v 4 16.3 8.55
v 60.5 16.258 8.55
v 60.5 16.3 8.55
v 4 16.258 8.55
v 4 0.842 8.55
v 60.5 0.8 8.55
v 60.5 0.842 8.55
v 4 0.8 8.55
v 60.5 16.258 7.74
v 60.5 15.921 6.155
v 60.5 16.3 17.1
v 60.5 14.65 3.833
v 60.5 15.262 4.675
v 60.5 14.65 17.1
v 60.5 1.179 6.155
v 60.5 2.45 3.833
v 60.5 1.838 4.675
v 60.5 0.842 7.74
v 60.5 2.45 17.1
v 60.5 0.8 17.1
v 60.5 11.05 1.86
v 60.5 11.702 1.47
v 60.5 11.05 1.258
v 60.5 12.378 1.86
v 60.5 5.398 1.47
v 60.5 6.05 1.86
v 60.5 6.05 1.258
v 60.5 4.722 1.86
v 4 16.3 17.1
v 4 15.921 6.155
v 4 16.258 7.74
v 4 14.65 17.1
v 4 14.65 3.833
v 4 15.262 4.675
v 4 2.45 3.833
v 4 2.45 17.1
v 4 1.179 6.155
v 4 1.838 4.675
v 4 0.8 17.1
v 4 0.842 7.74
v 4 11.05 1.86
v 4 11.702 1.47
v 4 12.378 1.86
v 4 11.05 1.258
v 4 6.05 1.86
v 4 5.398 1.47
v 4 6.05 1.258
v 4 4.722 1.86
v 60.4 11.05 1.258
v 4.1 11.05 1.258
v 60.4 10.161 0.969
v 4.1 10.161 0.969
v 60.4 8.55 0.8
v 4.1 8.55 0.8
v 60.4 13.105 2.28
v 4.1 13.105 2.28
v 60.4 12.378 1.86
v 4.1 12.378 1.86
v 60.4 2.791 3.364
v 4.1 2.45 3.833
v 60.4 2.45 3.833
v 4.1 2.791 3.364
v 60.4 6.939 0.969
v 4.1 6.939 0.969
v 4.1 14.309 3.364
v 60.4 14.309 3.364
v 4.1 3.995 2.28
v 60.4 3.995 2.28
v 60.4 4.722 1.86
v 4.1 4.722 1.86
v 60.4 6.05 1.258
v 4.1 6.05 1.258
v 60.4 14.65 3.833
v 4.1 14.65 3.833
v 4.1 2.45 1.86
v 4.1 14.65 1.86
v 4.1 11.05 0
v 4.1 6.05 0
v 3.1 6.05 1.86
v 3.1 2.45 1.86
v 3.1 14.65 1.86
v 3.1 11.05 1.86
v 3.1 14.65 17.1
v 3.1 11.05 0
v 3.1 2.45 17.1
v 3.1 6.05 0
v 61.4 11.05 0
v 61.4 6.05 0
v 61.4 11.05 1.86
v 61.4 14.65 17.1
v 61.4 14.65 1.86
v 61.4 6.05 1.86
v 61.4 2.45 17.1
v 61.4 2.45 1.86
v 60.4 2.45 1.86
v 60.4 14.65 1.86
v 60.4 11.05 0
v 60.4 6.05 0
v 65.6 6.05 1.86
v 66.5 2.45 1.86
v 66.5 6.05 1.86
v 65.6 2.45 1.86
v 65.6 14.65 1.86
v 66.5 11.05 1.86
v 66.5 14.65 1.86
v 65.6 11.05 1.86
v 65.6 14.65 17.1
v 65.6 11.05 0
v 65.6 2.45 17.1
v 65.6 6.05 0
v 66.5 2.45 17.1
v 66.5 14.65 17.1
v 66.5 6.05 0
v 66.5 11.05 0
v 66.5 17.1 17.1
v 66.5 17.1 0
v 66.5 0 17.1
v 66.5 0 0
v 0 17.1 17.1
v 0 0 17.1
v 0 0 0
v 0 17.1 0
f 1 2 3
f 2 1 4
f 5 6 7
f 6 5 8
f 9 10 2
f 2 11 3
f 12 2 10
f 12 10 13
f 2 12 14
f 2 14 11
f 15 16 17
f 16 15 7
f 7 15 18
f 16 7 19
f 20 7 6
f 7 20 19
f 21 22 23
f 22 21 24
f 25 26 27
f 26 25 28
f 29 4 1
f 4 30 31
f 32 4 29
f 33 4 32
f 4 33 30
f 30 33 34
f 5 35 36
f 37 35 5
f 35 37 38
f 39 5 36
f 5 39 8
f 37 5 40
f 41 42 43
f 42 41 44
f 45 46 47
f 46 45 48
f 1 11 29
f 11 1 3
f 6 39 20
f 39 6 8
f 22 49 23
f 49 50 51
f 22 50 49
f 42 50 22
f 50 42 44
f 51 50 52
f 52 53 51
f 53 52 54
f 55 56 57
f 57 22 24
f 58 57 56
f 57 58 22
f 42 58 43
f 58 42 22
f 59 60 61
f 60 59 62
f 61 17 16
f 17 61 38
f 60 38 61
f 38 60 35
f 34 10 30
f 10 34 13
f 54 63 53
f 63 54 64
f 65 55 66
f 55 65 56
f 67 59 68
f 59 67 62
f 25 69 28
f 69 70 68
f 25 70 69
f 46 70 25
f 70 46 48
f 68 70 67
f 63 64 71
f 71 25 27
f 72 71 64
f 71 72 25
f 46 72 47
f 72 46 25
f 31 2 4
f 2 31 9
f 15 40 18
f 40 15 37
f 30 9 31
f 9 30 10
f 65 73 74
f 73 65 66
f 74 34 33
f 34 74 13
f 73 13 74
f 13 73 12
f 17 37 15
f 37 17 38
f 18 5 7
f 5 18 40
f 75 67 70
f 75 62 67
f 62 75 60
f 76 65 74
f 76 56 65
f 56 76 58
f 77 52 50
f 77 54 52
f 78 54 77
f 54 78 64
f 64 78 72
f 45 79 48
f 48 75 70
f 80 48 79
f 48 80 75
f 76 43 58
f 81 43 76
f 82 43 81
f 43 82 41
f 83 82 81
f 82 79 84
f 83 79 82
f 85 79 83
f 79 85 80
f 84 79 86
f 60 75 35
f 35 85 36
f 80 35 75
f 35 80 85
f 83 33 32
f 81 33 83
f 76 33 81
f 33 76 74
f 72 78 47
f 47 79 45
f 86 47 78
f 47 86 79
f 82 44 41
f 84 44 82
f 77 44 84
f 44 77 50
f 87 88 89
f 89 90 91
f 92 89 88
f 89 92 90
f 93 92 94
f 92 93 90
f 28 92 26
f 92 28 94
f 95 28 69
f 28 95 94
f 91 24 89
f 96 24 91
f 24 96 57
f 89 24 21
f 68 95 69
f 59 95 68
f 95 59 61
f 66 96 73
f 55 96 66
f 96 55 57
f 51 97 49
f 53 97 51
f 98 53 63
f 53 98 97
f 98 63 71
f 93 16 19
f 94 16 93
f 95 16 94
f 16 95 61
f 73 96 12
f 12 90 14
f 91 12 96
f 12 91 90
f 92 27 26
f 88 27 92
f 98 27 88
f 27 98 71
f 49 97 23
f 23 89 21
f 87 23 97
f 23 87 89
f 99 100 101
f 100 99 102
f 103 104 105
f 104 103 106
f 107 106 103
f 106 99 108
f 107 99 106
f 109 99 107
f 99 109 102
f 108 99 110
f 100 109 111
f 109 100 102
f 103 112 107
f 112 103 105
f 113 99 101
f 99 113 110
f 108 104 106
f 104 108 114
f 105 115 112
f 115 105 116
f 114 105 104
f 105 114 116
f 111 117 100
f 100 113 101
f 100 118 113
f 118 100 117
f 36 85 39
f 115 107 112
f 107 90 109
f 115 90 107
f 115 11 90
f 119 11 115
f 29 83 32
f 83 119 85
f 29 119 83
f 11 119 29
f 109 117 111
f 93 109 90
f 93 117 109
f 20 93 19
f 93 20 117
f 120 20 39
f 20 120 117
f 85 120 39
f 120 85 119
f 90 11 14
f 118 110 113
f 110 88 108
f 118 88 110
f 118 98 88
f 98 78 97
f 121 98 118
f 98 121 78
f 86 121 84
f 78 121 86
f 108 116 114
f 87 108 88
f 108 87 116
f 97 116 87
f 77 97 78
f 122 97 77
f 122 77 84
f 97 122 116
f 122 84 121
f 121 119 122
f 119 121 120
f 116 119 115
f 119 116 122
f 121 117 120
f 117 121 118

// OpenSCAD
// file: ../parts/battery_tab.scad
// Battery tabs for holding AA and similar sized batterys.
// Built for Keystone Electronics parts 5201 and 5223.
// 5201: https://www.keyelco.com/product-pdf.cfm?p=900
// 5223: https://www.keyelco.com/product-pdf.cfm?p=910


// TODO: function to return array for polygon? Is that useful?
// function battery_tab_size() = [1.45,11.20,11.99];

module battery_tab() {
  difference() {
    union() {
      // TODO: round corners?
      cube(size=[0.5, 11.2, 11.99]);
      translate([0, 11.2/2 - 3/2, 11.99])
        cube(size=[0.5, 3, 6.35]);
      translate([0.5, 11.2/2, 5]) {
        rotate([0, 90, 0]) {
          cylinder(h=1.45, r1=5.99/2, r2=3.99/2);
        }
      }
      translate([0.5, 11.2/2, 10.74]) {
        rotate([0, 90, 0]) {
          cylinder(r=2.49/2, h=0.5);
        }
      }
    }

    translate([-0.5, 11.2/2, 18.34-1.5]) {
      rotate([0, 90, 0]) {
        cylinder(r=1.7/2, h=2);
      }
    }
    translate([-0.5, 11.2/2, 10.74]) {
      rotate([0, 90, 0]) {
        cylinder(r=1.52/2, h=2);
      }
    }
  }
}

// function battery_tab_cutout_size() = [1,11.5,12.5];
// Cutout is the foot print of the tab, with padding on y and z.
// Also, Need a sane way to return where the battery aligns.
module battery_tab_cutout(center=false, vpin=false, extend=0) {
  // If center, put the center of the button onto 0,0,0
  // If vpin, add a tall skinny cylinder to visualize where the center is.
  // If extend, 'pull' an edge of the tab that far to allow for inserting the actual tab
  sze=[1, 11.2 + 1, 11.99 + 0.5];
  offset=center?[-0.5,-sze[1]/2,-5]:[0,0,0];
  translate(offset) {
    cube(size=sze);
    if (extend > 0) {
      translate([0, 0, -sze[2]+1]) {
        cube(size=sze);
      }
    }
    if (vpin) {
      translate([0, sze[1]/2, sze[2]/2]) {
        rotate([0, 90, 0]) {
          cylinder(r=0.5, h=20, center=true);
        }
      }
    }
    translate([0, sze[1]/2 - 2.5, sze[2]-0.5]) {
      cube(size=[1, 5, 11]);
    }
  }
}

battery_tab_cutout(center=true, $fs=0.5);
// file: ../parts/batteries.scad
// For all, if hole is true, then make a suitable cutout for holding the battery *AND* space for springs and
// contacts to connect it.
//
// Review https://en.wikipedia.org/wiki/List_of_battery_sizes for missing sizes; add as needed.

// All of these are cylinders
batteries_by_name = [
  // Name, Height, Diameter, button-top
  ["AAAA", 42.5, 8.3, true],
  ["AAA", 44.5, 10.5, true],
  ["AA", 49.5, 14.5, true],
  ["A23", 28.5, 10.3, true],
  ["C", 50, 26.2, true],
  ["D", 61.5, 34.2, true],
  ["LR41", 3.6, 7.9, false],
  ["LR44", 5.4, 11, false],
  ["CR1130", 3, 11.5, false],
];

/// Get the dimensions of a battery by name
// @param name The common name of the battery.
// @param hole When true, this is a hole to put the battery into.
function battery_size_by_name(name="AA", hole=false) =
  let(found_idx=search([name], batteries_by_name),
      found=batteries_by_name[found_idx[0]],
      dia=found[2] + (hole?1:0),
      height=found[1] + (hole?7:0) // See notes below
      )
      [height,dia];

/// A battery by name
// @param name The common name of the battery.
// @param hole When true, this is a hole to put the battery into.
module battery_by_name(name="AA", hole=false) {
  found_idx=search([name], batteries_by_name);
  found = batteries_by_name[found_idx[0]];
  if (hole) {
    // if button-top type, assume that it will get held by a wire spring, so 
    //   3mm for compressed spring; 2mm for button; 2mm for spacing
    // if not button-top, assume sheet metal spring, so 1.
    cylinder(h=found[1] + (found[3]?7:1), d=found[2] + 1);

  }else {
    cylinder(h=found[1], d=found[2]);
    if (found[3]) {
      // !!!! There is no standard sizing of the button, so we'll use a single size for now.
      translate([0, 0, found[1]])
        cylinder(d=5.5, h=1);
    }
  }
}


module AAA(hole=false) {
  battery_by_name(parent_module(1), hole);
}
module AA(hole=false) {
  battery_by_name(parent_module(1), hole);
}
module C(hole=false) {
  battery_by_name(parent_module(1), hole);
}
module LR44(hole=false) {
  battery_by_name(parent_module(1), hole);
}
// main file
// HexBug BattleBot Remote Expander
// Because some of us have big hands.


// Hold the exsting remote with batery cover removed
// Hold two AA bateries and wires to old
// Prefer snap fit, but could use the old battery cover screw hole as anchor

// Still working out the battery things, but can be used as just a size increaser.

// will want rounded edges


echo(version=version());

use <../parts/batteries.scad>;
use <../parts/battery_tab.scad>;

// Values are in millimeters

$fs=0.5;
extruder_width = 0.4;
wall_thickness = 2*extruder_width;

////////////////////////////
function hyp(a,b) = sqrt(pow(a,2)+pow(b,2));


function HexBugBattleBotRemote_size() = [50,34,14];
module HexBugBattleBotRemote() {
  difference() {
    cube([50,34,14]);

    // corner cutouts
    mv=hyp(5,5)/2;
    translate([0,-mv,-0.5]) rotate([0,0,45]) cube([5,5,15]);
    translate([0,34-mv,-0.5]) rotate([0,0,45]) cube([5,5,15]);
    translate([50,34-mv,-0.5]) rotate([0,0,45]) cube([5,5,15]);
    translate([50,-mv,-0.5]) rotate([0,0,45]) cube([5,5,15]);

    // screw hole (not centered on X)
    //#translate([24,6,-0.5]) cylinder(d=1.6, h=3);

    // batteries:
    translate([11.65+6,12.8+6,2.1]) LR44();
    translate([24.1+6,12.8+6,2.1]) LR44();

    // battery cover
    translate([10.8,10,-0.1])
    difference() {
      cube([25.7,15.8,2.3]);
      mvv=hyp(4,4)/2;
      translate([0,-mvv,0]) rotate([0,0,45]) cube([4,4,4]);
      translate([0,15.8-mvv,0]) rotate([0,0,45]) cube([4,4,4]);
      translate([25.7,-mvv,0]) rotate([0,0,45]) cube([4,4,4]);
      translate([25.7,15.8-mvv,0]) rotate([0,0,45]) cube([4,4,4]);
    }
  }
}

/*
difference() {
  cube([50+wall_thickness*2,34+wall_thickness-0.5,10]);
  translate([wall_thickness,wall_thickness,wall_thickness])
    HexBugBattleBotRemote();
}
*/

function battery_holding_size(wall=wall_thickness) =
  let(aasize=battery_size_by_name("AA", hole=true))
  [4+6+4+aasize[0]*2, aasize[1]+wall*2, aasize[1]+wall*2];

// TODO: Add option to output just the cutouts
module battery_holding() {
  aasize=battery_size_by_name("AA", hole=true);
  // echo(aasize);
  aah=aasize[0]; // Room for battery and spring
  aad=aasize[1];

  // need ~6 between, and ~4 on each end. cutout from those is where the tabs go.
  hl= 4 + aah + 6 ;//+ aah + 4; //just half for now while sizing everything

  difference(){
    cube([hl,aad+wall_thickness*2,aad+wall_thickness*2]);

    // Cutout places for batteries
    translate([4, aad/2+wall_thickness, aad/2 + wall_thickness]) {
      rotate([0,90,0]) {
        union() {
          translate([-aad,-aad/2,0]) cube([aad,aad,aah]);
          AA(true);
        }
      }
    }
/* just half for now while sizing everything
    translate([4 + aah + 6, aad/2+wall_thickness, aad/2 + wall_thickness]) {
      rotate([0,90,0]) {
        union() {
          translate([-aad,-aad/2,0]) cube([aad,aad,aah]);
          AA(true);
        }
      }
    }
*/
    // Cutout places for tabs
    // The center of the main part of the tab should be at the center of the battery.
    // This should be a part.
    // gah. lining up the center of battery with the place it goes on the tabs…
    for(offset=[3.6, aah+4.4, aah+3.6+6, aah*2+6+4.4]) {
      // aad/2
      translate([offset, aad/2+wall_thickness, aad/2 + wall_thickness*2])
        rotate([180, 0, 0])
          battery_tab_cutout(center=true, vpin=false, extend=10);
      //   cube(size=[1, 5, 30], center=true);
      // translate([offset, aad/2+wall_thickness, 10.75])
      //   cube(size=[1, 11.5, aad], center=true);
    }
  }
}

battery_holding();
/*
remote = HexBugBattleBotRemote_size();
box = battery_holding_size() + [0, remote[1], 3];

use <MCAD/boxes.scad>

// TODO: Figure out how to route the wires.
// TODO: Figure out how to add metal contacts to LR44 stubs. (ring (or partial ring) and plate?)
difference() {
  translate([box[0]/2, box[1]/2, box[2]/2]) roundedBox(box, 5, true);
  translate([box[0]/2 - remote[0]/2, battery_holding_size()[1] + 1, box[2] - remote[2] + 1])
    HexBugBattleBotRemote();
  // translate([box[0]/2 - 15, box[1]/2, box[2]/2 - 3]) cube([30, 20, 10]);
  // %translate([0, 0, 0]) battery_holding();
}
*/
/* This is just a physical extension to make the controler bigger.
difference() {
  translate([box[0]/2, box[1]/2, box[2]/2]) roundedBox(box, 5, true);
  translate([box[0]/2 - remote[0]/2, battery_holding_size()[1] + 1, box[2] - remote[2] + 1])
    HexBugBattleBotRemote();
  translate([box[0]/2 - 15, box[1]/2, box[2]/2 - 3]) cube([30, 20, 10]);
}
*/


// vim: set ai et sw=2 ts=2 :
